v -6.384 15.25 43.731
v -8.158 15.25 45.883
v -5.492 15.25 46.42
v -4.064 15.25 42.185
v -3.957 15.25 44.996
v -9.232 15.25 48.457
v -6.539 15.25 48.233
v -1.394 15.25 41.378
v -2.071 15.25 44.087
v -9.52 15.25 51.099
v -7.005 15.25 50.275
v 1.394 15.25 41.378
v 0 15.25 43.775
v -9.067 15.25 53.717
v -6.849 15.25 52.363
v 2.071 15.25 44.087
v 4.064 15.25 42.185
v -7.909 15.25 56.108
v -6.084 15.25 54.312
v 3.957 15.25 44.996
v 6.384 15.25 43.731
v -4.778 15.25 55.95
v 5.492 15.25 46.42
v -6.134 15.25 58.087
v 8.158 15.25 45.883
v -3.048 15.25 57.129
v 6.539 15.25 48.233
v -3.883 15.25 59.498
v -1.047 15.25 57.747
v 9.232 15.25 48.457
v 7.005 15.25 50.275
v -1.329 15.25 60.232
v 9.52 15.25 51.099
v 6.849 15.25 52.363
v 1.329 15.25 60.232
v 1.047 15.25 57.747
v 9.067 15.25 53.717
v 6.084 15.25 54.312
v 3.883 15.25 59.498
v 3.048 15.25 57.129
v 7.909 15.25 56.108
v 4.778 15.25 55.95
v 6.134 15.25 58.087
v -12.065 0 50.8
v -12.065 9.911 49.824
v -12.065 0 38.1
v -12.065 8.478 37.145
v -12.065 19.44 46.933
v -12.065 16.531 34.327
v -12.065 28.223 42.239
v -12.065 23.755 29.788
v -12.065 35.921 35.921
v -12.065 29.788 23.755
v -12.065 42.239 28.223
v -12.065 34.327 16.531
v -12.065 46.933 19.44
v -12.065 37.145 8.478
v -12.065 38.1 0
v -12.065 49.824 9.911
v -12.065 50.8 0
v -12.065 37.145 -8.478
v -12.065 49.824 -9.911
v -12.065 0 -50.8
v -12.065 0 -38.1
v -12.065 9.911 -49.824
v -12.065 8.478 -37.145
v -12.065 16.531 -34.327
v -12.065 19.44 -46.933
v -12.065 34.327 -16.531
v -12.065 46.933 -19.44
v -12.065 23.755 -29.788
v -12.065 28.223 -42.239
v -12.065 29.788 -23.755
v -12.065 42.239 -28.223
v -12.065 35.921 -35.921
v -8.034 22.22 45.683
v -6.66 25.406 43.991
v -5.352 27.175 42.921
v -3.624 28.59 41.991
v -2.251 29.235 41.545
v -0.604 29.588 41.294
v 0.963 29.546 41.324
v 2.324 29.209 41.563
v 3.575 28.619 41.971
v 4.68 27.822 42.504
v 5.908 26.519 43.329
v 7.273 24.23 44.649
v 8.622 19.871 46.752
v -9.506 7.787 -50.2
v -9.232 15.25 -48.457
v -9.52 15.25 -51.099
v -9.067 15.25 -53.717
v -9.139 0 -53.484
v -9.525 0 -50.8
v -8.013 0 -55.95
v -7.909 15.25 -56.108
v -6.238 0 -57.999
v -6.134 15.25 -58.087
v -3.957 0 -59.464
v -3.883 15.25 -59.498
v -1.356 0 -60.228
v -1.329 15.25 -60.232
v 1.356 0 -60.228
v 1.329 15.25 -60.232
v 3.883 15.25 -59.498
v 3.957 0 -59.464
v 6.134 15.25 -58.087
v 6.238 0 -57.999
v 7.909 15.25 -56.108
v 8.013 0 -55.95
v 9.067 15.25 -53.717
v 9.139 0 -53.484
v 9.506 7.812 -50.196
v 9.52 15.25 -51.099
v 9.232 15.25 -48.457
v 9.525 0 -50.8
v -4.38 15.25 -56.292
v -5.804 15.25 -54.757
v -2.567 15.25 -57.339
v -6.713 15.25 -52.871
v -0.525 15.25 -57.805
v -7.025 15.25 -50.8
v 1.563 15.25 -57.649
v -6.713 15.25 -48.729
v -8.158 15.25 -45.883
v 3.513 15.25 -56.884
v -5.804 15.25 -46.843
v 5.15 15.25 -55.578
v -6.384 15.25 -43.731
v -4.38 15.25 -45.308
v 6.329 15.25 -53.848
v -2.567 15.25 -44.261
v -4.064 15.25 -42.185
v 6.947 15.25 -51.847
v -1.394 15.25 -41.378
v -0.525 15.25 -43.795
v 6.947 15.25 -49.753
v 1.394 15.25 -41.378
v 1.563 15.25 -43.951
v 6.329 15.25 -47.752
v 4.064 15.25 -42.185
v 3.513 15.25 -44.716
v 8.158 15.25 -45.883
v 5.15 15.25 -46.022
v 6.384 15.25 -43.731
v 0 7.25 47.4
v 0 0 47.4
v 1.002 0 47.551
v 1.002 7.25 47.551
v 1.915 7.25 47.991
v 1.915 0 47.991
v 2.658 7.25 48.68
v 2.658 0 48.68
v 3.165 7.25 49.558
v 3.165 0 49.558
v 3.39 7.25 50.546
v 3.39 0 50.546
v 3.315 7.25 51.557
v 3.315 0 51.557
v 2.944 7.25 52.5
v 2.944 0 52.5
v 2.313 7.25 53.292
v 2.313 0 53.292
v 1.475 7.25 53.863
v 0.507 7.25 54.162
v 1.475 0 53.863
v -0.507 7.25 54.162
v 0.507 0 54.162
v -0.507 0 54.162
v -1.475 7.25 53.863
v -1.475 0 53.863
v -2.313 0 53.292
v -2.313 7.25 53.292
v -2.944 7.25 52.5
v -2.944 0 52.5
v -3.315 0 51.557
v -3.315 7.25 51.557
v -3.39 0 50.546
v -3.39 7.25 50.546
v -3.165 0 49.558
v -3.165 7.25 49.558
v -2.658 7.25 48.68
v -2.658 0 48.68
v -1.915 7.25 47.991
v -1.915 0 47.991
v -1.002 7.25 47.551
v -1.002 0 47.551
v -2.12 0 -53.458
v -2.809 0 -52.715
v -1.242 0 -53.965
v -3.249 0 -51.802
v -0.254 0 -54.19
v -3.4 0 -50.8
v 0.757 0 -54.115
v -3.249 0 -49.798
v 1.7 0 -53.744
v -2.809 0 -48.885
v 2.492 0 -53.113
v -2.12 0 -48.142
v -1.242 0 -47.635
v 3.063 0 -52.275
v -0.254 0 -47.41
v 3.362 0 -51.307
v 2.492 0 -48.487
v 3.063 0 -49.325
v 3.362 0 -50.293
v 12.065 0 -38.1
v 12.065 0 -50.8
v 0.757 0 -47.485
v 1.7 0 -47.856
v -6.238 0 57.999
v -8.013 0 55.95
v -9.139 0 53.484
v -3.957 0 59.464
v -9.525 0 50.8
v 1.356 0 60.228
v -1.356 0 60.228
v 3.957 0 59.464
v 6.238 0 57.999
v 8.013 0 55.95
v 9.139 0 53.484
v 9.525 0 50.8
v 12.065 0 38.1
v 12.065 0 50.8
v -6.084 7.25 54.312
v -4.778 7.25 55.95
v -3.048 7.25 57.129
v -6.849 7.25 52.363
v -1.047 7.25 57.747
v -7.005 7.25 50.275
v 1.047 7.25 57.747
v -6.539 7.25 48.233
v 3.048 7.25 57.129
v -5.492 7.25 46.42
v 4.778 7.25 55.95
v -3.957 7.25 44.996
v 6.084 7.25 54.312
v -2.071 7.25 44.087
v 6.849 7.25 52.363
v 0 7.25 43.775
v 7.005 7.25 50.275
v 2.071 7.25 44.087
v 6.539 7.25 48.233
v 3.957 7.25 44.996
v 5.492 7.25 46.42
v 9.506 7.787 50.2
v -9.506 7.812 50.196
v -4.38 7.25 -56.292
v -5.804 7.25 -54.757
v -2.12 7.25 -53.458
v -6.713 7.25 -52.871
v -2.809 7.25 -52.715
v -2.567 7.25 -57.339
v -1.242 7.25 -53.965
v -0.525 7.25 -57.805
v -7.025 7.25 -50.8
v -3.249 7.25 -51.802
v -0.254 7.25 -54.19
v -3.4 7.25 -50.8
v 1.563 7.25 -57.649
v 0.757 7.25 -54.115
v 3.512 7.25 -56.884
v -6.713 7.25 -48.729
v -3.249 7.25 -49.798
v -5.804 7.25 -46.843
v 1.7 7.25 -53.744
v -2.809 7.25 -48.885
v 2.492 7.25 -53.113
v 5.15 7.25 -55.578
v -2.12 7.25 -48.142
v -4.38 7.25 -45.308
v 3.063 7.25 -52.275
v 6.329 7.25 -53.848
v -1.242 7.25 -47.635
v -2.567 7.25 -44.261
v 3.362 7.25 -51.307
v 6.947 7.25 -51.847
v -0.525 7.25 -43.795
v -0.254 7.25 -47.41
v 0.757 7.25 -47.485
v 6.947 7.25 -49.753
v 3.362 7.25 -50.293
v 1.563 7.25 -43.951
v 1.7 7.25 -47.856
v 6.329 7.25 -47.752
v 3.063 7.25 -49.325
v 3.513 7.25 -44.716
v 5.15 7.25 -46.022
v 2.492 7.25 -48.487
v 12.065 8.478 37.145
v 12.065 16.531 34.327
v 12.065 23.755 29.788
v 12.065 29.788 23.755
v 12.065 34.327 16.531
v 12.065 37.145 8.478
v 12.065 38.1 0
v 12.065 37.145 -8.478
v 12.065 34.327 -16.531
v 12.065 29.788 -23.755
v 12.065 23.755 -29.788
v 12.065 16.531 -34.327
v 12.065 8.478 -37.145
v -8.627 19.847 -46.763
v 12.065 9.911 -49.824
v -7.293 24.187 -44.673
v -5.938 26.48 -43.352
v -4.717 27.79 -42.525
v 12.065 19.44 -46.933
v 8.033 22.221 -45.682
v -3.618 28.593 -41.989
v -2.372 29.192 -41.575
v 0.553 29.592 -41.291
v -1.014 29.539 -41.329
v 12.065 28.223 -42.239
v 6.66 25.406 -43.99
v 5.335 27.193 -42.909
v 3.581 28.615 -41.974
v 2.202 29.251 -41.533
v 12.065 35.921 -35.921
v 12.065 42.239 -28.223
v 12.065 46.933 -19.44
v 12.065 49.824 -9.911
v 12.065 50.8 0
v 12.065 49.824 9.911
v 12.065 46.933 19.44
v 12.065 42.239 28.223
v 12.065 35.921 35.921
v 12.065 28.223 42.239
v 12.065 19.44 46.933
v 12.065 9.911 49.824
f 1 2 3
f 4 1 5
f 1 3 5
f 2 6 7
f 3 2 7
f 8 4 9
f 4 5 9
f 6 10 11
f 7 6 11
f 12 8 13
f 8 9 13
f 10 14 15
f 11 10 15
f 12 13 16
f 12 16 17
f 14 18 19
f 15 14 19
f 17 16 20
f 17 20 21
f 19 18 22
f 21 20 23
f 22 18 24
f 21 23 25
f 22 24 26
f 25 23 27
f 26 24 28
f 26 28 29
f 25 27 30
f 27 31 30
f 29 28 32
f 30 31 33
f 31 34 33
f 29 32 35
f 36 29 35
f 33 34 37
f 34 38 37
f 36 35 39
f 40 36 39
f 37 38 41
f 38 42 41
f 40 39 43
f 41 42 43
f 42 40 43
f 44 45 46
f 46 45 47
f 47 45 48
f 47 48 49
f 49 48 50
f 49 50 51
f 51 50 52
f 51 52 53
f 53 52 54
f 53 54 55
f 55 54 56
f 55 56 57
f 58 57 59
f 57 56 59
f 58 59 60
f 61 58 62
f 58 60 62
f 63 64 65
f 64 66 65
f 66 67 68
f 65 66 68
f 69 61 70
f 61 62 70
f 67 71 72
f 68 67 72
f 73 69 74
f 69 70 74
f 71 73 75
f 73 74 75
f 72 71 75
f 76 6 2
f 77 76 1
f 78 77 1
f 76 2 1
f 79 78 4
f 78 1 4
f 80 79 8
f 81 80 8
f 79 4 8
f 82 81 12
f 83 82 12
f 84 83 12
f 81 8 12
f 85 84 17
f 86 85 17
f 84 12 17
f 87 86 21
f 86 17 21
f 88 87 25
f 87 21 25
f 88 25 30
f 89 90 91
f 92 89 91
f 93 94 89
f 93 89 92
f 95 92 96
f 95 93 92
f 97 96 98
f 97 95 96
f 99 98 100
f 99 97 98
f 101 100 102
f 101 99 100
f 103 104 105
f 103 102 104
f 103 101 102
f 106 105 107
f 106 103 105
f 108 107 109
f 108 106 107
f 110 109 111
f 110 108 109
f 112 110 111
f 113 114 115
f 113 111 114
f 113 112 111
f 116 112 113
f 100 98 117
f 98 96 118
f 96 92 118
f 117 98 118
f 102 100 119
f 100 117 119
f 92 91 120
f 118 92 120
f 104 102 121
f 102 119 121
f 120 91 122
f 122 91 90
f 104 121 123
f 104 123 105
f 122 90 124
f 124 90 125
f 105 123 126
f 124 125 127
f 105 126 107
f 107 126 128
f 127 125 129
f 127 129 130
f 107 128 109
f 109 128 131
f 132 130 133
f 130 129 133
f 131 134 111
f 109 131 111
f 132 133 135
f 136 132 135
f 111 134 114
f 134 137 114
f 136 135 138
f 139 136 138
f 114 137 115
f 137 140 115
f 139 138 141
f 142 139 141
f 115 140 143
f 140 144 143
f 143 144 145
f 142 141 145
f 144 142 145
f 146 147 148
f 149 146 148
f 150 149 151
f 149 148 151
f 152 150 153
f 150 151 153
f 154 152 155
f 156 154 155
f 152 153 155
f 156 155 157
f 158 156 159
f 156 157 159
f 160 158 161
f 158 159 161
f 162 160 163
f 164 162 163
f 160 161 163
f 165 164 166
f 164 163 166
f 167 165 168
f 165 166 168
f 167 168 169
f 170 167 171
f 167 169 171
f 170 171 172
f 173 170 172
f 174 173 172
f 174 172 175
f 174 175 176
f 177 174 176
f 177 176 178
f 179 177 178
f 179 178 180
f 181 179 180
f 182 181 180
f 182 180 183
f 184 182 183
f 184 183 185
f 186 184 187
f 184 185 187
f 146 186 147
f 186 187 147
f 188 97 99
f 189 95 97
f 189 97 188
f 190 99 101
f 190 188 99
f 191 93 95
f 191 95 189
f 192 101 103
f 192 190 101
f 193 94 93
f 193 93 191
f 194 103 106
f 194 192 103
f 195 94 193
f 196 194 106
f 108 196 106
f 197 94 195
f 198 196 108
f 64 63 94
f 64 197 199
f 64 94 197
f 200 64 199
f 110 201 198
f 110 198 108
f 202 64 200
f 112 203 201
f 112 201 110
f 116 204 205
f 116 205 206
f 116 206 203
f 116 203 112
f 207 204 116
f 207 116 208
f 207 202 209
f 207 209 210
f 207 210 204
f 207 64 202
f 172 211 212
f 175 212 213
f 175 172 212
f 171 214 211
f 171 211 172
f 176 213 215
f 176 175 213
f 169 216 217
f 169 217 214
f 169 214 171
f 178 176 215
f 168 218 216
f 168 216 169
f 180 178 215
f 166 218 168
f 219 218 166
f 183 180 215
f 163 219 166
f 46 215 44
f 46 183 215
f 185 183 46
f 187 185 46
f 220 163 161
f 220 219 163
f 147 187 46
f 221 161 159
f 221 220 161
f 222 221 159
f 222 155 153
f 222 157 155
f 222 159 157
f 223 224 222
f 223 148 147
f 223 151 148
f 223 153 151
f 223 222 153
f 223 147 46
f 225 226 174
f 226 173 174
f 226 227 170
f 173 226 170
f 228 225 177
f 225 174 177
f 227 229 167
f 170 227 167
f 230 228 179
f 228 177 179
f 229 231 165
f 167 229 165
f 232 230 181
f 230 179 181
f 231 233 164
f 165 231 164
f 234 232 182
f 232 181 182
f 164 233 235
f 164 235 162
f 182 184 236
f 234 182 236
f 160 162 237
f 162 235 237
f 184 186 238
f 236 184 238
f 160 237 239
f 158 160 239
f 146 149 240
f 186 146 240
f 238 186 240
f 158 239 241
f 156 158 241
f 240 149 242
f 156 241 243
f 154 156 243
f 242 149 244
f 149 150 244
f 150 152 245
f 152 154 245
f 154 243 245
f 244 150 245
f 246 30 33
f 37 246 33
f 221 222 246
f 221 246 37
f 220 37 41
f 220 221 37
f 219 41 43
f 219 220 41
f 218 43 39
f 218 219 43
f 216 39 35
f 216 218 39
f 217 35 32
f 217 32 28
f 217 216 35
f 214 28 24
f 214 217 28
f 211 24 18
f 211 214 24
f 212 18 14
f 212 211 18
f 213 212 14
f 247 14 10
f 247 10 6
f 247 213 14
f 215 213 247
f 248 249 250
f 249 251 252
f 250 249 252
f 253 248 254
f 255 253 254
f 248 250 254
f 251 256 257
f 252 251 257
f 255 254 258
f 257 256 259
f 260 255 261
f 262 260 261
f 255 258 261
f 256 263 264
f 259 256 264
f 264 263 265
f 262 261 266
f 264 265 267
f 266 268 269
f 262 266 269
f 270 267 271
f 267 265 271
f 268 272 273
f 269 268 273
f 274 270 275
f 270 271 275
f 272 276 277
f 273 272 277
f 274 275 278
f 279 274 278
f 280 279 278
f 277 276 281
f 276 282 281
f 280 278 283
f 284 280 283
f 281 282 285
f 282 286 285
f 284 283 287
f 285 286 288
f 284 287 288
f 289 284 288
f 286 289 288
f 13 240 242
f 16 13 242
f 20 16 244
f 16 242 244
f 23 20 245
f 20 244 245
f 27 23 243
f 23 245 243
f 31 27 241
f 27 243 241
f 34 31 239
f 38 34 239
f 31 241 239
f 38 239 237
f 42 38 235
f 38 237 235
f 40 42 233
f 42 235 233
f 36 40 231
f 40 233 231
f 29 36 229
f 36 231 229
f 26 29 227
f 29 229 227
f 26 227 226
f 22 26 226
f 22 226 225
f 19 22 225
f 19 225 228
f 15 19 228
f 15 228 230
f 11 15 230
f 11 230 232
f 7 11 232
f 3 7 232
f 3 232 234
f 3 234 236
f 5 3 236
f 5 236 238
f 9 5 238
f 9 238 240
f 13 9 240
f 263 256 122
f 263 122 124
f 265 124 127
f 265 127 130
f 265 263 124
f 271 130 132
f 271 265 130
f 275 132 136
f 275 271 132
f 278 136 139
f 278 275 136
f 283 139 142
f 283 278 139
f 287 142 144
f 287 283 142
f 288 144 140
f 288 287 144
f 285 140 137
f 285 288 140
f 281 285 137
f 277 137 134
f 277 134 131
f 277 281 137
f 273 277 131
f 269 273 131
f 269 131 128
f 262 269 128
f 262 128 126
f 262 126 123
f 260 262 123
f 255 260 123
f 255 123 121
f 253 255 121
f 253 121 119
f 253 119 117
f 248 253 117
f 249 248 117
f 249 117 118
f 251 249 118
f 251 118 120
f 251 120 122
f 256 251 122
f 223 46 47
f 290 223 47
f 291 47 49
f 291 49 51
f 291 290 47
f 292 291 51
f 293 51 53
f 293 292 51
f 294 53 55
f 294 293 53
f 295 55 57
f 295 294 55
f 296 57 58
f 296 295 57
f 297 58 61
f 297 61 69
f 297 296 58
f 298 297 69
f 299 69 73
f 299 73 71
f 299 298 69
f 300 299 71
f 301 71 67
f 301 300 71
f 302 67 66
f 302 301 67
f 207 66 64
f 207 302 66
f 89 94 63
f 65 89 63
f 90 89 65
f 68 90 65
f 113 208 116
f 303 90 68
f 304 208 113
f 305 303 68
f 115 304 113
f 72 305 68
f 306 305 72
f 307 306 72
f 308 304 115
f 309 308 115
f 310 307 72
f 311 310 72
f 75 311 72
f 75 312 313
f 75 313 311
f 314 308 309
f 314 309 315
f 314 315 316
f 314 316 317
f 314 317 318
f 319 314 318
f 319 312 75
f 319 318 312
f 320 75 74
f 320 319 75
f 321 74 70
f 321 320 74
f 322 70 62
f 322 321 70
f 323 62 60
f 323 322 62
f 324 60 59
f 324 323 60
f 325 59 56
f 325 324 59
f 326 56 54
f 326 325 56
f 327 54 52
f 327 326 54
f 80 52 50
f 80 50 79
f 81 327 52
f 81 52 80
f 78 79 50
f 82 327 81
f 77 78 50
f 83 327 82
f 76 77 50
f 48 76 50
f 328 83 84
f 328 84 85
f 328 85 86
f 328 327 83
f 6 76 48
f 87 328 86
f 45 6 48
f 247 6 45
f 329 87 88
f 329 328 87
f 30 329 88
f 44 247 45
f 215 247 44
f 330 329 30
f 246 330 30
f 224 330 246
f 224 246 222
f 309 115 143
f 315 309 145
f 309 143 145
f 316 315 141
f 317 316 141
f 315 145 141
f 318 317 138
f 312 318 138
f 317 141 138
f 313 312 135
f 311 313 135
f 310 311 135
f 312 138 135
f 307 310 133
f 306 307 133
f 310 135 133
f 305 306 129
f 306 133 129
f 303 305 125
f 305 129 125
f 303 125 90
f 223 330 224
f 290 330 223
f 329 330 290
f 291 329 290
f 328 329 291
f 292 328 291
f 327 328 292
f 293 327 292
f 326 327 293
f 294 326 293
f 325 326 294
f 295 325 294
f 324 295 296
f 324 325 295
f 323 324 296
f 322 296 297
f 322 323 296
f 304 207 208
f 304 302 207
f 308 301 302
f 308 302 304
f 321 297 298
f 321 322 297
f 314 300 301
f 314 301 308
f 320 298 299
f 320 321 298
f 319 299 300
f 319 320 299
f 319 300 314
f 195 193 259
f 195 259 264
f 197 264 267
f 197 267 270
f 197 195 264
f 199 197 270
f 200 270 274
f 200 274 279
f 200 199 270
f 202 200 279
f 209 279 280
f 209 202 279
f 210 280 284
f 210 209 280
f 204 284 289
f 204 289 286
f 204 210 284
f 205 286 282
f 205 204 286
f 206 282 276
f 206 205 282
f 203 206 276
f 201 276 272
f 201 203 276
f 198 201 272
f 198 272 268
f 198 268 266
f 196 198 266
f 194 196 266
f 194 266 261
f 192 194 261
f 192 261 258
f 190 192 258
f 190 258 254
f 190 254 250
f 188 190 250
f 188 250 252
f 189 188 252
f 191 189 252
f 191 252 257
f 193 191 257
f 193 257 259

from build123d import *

# Parameters (mm, degrees)
BOSS_EXTRUDE1_DEPTH = 12.065
SKETCH2_6_R         = 9.525
CUT_EXTRUDE1_DEPTH  = 68.25
SKETCH2_R           = 9.525
SKETCH2_R_2         = 7.025
BOSS_EXTRUDE2_DEPTH = 15.25
SKETCH2_8_R         = 7.025
SKETCH2_8_R_2       = 3.4
BOSS_EXTRUDE3_DEPTH = 7.25


with BuildPart() as part:
    # Sketch1 → Boss-Extrude1 (new, symmetric)
    with BuildSketch(Plane(origin=(0, 0, 0), x_dir=(0, 0, -1), z_dir=(1, 0, 0))):
        with BuildLine():
            Line((38.1, 0), (50.8, 0))
            ThreePointArc((50.8, 0), (0, 50.8), (-50.8, 0))
            Line((-50.8, 0), (-38.1, 0))
            ThreePointArc((-38.1, 0), (0, 38.1), (38.1, 0))
        make_face()
        with BuildLine():
            ThreePointArc((-38.1, 0), (0, 38.1), (38.1, 0))
            Line((38.1, 0), (50.8, 0))
            ThreePointArc((50.8, 0), (0, 50.8), (-50.8, 0))
            Line((-50.8, 0), (-38.1, 0))
        make_face()
        with BuildLine():
            ThreePointArc((-38.1, 0), (0, 38.1), (38.1, 0))
            Line((38.1, 0), (50.8, 0))
            ThreePointArc((50.8, 0), (0, 50.8), (-50.8, 0))
            Line((-50.8, 0), (-38.1, 0))
        make_face()
    extrude(amount=BOSS_EXTRUDE1_DEPTH, both=True)

    # Sketch2<6> → Cut-Extrude1 (cut)
    with BuildSketch(Plane.XZ):
        with Locations((0, -50.8)):
            Circle(SKETCH2_6_R)
        with Locations((0, 50.8)):
            Circle(SKETCH2_6_R)
    extrude(amount=-CUT_EXTRUDE1_DEPTH, mode=Mode.SUBTRACT)

    # Sketch2 → Boss-Extrude2 (add)
    # profile 1 of 2: a face of its own
    with BuildSketch(Plane.XZ):
        with Locations((0, -50.8)):
            Circle(SKETCH2_R)
        with Locations((0, -50.8)):
            Circle(SKETCH2_R_2, mode=Mode.SUBTRACT)
    # profile 2 of 2: a face of its own
    with BuildSketch(Plane.XZ):
        with Locations((0, 50.8)):
            Circle(SKETCH2_R)
        with Locations((0, 50.8)):
            Circle(SKETCH2_R_2, mode=Mode.SUBTRACT)
    extrude(amount=-BOSS_EXTRUDE2_DEPTH)

    # Sketch2<8> → Boss-Extrude3 (add)
    # profile 1 of 2: a face of its own
    with BuildSketch(Plane.XZ):
        with Locations((0, -50.8)):
            Circle(SKETCH2_8_R)
        with Locations((0, -50.8)):
            Circle(SKETCH2_8_R_2, mode=Mode.SUBTRACT)
    # profile 2 of 2: a face of its own
    with BuildSketch(Plane.XZ):
        with Locations((0, 50.8)):
            Circle(SKETCH2_8_R)
        with Locations((0, 50.8)):
            Circle(SKETCH2_8_R_2, mode=Mode.SUBTRACT)
    extrude(amount=-BOSS_EXTRUDE3_DEPTH)


solid = part.part
